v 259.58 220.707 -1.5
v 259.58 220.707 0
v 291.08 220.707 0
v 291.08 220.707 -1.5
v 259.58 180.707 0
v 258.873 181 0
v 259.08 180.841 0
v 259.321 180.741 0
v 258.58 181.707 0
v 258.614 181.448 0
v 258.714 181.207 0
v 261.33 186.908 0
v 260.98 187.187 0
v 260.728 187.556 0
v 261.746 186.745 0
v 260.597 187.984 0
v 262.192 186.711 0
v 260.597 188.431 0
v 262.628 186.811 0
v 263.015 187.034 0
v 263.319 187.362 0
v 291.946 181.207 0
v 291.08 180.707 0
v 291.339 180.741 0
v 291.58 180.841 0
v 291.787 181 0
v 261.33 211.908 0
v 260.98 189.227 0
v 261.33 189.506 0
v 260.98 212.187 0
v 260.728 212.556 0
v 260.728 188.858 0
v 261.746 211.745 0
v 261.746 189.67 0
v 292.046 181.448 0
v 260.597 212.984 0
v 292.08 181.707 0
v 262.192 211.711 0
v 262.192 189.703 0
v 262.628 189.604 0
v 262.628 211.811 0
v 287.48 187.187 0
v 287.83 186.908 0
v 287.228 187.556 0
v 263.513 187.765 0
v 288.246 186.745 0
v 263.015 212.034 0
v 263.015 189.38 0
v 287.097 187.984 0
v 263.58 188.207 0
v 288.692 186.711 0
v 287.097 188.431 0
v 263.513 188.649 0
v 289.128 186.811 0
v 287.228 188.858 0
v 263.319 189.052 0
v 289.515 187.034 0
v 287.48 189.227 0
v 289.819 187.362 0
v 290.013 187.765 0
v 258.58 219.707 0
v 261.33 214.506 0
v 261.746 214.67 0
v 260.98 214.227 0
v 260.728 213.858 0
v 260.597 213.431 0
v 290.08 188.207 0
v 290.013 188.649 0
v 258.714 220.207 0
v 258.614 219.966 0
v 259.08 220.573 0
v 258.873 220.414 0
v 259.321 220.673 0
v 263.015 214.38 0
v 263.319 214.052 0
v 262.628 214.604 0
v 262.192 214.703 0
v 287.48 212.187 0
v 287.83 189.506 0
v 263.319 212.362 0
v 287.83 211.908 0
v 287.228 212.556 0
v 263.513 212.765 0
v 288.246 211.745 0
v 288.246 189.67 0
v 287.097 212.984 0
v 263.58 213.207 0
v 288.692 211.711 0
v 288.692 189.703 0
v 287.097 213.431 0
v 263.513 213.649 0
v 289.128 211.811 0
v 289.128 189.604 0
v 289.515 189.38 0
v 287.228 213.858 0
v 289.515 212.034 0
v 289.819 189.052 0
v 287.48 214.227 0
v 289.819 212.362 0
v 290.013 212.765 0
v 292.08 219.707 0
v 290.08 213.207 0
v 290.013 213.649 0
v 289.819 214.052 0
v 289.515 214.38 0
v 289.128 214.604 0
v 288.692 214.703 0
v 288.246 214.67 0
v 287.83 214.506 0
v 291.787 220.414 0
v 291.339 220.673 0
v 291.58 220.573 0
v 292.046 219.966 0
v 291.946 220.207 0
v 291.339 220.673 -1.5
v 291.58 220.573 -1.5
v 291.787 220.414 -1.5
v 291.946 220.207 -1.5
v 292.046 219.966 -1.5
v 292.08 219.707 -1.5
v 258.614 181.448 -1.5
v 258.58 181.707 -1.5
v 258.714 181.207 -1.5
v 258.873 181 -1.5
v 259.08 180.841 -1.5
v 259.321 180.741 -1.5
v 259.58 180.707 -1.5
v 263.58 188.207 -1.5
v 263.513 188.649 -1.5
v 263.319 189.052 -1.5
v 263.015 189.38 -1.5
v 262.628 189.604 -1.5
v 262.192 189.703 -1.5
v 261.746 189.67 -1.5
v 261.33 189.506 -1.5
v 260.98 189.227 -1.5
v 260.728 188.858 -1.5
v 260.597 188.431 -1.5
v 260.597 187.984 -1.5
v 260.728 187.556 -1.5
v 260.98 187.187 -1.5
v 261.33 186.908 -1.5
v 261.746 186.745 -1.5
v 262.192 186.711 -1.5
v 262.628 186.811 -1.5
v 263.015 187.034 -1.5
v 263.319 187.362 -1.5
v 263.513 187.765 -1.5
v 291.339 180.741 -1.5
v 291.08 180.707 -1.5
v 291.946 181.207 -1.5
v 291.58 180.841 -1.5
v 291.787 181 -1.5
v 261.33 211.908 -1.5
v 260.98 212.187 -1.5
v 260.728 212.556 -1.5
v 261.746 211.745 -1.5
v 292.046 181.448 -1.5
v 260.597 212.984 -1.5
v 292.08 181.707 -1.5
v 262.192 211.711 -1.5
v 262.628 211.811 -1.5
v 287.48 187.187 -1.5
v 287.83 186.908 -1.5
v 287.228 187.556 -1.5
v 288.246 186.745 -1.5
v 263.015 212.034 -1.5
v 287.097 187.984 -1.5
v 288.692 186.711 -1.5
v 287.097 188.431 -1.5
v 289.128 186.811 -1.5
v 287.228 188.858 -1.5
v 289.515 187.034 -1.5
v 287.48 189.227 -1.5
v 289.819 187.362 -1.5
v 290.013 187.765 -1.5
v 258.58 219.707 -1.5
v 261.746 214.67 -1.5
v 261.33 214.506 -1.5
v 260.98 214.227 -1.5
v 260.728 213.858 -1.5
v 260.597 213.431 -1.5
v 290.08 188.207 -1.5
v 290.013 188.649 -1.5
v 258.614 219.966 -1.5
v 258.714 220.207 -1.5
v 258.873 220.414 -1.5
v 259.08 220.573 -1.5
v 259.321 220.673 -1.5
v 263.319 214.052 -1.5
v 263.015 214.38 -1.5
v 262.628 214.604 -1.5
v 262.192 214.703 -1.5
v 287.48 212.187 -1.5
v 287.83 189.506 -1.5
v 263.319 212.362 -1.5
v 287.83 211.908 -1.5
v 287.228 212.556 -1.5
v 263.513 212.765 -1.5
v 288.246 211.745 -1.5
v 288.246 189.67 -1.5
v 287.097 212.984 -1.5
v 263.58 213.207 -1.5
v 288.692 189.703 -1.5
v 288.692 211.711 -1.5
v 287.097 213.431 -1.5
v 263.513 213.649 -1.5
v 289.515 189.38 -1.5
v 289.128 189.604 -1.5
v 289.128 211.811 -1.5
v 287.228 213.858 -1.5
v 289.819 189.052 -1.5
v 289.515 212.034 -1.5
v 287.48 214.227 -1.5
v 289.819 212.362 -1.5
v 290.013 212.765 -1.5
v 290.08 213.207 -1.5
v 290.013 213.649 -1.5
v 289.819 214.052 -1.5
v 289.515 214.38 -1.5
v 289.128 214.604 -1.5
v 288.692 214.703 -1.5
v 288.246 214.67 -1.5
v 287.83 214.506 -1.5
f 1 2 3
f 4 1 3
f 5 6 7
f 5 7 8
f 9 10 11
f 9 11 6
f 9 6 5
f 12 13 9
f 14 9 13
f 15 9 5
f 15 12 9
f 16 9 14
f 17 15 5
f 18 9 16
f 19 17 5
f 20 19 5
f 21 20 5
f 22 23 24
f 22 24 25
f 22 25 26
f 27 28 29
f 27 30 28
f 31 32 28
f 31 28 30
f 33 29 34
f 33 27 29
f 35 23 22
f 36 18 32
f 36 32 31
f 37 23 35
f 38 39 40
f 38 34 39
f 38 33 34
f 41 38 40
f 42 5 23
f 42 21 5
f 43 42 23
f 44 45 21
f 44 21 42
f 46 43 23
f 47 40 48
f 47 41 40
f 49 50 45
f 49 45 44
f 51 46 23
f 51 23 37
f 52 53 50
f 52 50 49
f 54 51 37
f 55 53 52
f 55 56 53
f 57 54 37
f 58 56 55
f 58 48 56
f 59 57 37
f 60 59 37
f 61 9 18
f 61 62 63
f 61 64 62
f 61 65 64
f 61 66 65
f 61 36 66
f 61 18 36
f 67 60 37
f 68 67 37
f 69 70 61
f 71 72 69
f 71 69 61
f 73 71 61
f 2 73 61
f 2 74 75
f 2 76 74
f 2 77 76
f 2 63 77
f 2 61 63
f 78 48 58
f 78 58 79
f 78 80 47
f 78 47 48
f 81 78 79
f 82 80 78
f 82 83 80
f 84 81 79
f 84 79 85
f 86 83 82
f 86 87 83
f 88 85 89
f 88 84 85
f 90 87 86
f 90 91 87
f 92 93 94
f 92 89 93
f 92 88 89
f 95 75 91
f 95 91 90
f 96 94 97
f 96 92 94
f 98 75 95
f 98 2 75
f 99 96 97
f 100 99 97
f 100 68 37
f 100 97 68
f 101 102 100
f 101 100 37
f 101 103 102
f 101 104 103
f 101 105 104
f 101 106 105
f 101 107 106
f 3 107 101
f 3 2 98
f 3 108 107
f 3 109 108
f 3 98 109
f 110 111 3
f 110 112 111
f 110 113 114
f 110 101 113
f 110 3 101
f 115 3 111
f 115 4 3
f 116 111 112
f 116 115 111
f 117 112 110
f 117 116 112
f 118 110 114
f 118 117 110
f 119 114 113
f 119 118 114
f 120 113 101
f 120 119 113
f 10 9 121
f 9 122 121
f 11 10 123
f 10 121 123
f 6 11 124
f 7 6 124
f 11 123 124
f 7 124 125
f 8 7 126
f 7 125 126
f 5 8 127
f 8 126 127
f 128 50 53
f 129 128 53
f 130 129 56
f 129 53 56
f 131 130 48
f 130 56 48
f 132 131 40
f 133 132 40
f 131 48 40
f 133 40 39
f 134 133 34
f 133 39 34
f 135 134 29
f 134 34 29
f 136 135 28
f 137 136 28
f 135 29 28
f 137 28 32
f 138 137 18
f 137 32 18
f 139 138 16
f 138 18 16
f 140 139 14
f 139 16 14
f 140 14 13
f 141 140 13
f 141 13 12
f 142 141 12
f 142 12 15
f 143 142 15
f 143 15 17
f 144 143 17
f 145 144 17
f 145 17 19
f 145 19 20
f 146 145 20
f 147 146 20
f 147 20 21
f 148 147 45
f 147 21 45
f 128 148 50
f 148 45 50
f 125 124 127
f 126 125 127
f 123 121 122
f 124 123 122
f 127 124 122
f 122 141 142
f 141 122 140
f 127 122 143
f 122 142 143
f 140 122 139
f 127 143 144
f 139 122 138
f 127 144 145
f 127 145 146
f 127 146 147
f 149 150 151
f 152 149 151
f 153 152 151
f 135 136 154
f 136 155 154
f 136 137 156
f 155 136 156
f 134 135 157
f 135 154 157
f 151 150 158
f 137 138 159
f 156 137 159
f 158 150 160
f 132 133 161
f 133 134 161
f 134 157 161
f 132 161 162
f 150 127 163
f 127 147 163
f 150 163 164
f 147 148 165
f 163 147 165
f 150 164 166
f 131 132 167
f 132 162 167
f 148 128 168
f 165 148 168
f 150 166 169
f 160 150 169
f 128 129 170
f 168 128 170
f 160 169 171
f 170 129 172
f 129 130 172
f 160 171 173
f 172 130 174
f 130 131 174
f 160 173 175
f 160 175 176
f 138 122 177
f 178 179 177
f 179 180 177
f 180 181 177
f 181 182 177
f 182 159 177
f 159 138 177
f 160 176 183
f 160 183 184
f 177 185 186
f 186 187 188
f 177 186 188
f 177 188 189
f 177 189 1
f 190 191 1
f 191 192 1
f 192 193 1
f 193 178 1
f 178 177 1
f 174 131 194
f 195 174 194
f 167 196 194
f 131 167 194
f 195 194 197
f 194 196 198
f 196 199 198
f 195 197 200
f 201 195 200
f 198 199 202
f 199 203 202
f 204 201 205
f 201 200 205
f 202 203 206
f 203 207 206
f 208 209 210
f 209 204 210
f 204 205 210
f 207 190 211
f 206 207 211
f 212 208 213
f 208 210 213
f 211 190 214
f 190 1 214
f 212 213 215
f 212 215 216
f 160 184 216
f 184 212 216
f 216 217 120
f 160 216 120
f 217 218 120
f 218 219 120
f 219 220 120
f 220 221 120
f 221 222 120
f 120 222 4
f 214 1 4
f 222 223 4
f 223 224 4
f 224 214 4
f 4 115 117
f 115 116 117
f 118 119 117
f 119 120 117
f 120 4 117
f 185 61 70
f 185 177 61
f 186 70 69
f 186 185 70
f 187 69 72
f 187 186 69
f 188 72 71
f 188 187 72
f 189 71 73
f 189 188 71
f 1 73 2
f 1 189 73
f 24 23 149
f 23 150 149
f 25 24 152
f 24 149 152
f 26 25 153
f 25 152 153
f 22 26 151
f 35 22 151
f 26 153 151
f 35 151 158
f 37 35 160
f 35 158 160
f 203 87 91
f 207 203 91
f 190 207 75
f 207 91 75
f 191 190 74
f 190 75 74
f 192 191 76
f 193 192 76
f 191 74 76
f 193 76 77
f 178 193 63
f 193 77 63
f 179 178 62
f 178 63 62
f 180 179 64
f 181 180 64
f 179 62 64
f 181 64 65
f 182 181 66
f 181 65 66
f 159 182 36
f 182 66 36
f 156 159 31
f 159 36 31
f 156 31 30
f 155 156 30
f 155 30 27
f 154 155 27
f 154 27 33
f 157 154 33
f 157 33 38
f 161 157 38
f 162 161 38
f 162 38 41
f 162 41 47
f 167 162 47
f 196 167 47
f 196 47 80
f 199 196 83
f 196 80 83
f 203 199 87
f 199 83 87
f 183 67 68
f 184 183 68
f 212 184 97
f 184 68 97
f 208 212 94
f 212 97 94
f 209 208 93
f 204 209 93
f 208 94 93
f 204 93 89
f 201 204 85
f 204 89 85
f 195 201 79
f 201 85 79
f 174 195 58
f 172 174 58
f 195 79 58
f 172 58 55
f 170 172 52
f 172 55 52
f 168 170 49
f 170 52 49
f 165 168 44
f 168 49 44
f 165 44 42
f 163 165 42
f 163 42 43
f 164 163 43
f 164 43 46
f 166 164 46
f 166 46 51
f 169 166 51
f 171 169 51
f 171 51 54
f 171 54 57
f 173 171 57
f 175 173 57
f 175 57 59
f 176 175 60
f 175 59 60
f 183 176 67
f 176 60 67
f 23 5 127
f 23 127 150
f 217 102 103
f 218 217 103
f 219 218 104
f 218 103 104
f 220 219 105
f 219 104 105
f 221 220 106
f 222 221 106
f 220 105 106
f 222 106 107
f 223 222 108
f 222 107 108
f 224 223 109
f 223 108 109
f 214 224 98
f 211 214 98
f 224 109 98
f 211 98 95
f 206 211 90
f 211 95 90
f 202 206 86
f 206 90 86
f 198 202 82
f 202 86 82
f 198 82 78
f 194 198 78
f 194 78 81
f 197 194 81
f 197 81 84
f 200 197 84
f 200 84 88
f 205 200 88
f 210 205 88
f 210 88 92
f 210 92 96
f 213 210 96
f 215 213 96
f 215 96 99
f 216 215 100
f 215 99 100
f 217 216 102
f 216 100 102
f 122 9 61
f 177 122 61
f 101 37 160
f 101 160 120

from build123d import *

# Parameters (mm, degrees)
SKETCH2_W          = 33.5
SKETCH2_H          = 40
SKETCH2_R          = 1.5
BASE_FLANGE1_DEPTH = 1.5
FILLET1_R          = 1


# Sheet-metal steps are written as plain solids
with BuildPart() as part:
    # Sketch2 → Base-Flange1 (new body)
    with BuildSketch(Plane.XY):
        with Locations((275.329860694, 200.707229453)):
            Rectangle(SKETCH2_W, SKETCH2_H)
        with Locations((288.579860694, 213.207229453)):
            Circle(SKETCH2_R, mode=Mode.SUBTRACT)
        with Locations((288.579860694, 188.207229453)):
            Circle(SKETCH2_R, mode=Mode.SUBTRACT)
        with Locations((262.079860694, 213.207229453)):
            Circle(SKETCH2_R, mode=Mode.SUBTRACT)
        with Locations((262.079860694, 188.207229453)):
            Circle(SKETCH2_R, mode=Mode.SUBTRACT)
    extrude(amount=-BASE_FLANGE1_DEPTH)

    # Fillet1
    fillet1_edges = [part.edges().sort_by_distance(p)[0] for p in [
        (258.579860694, 220.707229453, -0.75),
        (292.079860694, 220.707229453, -0.75),
        (292.079860694, 180.707229453, -0.75),
        (258.579860694, 180.707229453, -0.75),
    ]]
    fillet(fillet1_edges, radius=FILLET1_R)


solid = part.part
